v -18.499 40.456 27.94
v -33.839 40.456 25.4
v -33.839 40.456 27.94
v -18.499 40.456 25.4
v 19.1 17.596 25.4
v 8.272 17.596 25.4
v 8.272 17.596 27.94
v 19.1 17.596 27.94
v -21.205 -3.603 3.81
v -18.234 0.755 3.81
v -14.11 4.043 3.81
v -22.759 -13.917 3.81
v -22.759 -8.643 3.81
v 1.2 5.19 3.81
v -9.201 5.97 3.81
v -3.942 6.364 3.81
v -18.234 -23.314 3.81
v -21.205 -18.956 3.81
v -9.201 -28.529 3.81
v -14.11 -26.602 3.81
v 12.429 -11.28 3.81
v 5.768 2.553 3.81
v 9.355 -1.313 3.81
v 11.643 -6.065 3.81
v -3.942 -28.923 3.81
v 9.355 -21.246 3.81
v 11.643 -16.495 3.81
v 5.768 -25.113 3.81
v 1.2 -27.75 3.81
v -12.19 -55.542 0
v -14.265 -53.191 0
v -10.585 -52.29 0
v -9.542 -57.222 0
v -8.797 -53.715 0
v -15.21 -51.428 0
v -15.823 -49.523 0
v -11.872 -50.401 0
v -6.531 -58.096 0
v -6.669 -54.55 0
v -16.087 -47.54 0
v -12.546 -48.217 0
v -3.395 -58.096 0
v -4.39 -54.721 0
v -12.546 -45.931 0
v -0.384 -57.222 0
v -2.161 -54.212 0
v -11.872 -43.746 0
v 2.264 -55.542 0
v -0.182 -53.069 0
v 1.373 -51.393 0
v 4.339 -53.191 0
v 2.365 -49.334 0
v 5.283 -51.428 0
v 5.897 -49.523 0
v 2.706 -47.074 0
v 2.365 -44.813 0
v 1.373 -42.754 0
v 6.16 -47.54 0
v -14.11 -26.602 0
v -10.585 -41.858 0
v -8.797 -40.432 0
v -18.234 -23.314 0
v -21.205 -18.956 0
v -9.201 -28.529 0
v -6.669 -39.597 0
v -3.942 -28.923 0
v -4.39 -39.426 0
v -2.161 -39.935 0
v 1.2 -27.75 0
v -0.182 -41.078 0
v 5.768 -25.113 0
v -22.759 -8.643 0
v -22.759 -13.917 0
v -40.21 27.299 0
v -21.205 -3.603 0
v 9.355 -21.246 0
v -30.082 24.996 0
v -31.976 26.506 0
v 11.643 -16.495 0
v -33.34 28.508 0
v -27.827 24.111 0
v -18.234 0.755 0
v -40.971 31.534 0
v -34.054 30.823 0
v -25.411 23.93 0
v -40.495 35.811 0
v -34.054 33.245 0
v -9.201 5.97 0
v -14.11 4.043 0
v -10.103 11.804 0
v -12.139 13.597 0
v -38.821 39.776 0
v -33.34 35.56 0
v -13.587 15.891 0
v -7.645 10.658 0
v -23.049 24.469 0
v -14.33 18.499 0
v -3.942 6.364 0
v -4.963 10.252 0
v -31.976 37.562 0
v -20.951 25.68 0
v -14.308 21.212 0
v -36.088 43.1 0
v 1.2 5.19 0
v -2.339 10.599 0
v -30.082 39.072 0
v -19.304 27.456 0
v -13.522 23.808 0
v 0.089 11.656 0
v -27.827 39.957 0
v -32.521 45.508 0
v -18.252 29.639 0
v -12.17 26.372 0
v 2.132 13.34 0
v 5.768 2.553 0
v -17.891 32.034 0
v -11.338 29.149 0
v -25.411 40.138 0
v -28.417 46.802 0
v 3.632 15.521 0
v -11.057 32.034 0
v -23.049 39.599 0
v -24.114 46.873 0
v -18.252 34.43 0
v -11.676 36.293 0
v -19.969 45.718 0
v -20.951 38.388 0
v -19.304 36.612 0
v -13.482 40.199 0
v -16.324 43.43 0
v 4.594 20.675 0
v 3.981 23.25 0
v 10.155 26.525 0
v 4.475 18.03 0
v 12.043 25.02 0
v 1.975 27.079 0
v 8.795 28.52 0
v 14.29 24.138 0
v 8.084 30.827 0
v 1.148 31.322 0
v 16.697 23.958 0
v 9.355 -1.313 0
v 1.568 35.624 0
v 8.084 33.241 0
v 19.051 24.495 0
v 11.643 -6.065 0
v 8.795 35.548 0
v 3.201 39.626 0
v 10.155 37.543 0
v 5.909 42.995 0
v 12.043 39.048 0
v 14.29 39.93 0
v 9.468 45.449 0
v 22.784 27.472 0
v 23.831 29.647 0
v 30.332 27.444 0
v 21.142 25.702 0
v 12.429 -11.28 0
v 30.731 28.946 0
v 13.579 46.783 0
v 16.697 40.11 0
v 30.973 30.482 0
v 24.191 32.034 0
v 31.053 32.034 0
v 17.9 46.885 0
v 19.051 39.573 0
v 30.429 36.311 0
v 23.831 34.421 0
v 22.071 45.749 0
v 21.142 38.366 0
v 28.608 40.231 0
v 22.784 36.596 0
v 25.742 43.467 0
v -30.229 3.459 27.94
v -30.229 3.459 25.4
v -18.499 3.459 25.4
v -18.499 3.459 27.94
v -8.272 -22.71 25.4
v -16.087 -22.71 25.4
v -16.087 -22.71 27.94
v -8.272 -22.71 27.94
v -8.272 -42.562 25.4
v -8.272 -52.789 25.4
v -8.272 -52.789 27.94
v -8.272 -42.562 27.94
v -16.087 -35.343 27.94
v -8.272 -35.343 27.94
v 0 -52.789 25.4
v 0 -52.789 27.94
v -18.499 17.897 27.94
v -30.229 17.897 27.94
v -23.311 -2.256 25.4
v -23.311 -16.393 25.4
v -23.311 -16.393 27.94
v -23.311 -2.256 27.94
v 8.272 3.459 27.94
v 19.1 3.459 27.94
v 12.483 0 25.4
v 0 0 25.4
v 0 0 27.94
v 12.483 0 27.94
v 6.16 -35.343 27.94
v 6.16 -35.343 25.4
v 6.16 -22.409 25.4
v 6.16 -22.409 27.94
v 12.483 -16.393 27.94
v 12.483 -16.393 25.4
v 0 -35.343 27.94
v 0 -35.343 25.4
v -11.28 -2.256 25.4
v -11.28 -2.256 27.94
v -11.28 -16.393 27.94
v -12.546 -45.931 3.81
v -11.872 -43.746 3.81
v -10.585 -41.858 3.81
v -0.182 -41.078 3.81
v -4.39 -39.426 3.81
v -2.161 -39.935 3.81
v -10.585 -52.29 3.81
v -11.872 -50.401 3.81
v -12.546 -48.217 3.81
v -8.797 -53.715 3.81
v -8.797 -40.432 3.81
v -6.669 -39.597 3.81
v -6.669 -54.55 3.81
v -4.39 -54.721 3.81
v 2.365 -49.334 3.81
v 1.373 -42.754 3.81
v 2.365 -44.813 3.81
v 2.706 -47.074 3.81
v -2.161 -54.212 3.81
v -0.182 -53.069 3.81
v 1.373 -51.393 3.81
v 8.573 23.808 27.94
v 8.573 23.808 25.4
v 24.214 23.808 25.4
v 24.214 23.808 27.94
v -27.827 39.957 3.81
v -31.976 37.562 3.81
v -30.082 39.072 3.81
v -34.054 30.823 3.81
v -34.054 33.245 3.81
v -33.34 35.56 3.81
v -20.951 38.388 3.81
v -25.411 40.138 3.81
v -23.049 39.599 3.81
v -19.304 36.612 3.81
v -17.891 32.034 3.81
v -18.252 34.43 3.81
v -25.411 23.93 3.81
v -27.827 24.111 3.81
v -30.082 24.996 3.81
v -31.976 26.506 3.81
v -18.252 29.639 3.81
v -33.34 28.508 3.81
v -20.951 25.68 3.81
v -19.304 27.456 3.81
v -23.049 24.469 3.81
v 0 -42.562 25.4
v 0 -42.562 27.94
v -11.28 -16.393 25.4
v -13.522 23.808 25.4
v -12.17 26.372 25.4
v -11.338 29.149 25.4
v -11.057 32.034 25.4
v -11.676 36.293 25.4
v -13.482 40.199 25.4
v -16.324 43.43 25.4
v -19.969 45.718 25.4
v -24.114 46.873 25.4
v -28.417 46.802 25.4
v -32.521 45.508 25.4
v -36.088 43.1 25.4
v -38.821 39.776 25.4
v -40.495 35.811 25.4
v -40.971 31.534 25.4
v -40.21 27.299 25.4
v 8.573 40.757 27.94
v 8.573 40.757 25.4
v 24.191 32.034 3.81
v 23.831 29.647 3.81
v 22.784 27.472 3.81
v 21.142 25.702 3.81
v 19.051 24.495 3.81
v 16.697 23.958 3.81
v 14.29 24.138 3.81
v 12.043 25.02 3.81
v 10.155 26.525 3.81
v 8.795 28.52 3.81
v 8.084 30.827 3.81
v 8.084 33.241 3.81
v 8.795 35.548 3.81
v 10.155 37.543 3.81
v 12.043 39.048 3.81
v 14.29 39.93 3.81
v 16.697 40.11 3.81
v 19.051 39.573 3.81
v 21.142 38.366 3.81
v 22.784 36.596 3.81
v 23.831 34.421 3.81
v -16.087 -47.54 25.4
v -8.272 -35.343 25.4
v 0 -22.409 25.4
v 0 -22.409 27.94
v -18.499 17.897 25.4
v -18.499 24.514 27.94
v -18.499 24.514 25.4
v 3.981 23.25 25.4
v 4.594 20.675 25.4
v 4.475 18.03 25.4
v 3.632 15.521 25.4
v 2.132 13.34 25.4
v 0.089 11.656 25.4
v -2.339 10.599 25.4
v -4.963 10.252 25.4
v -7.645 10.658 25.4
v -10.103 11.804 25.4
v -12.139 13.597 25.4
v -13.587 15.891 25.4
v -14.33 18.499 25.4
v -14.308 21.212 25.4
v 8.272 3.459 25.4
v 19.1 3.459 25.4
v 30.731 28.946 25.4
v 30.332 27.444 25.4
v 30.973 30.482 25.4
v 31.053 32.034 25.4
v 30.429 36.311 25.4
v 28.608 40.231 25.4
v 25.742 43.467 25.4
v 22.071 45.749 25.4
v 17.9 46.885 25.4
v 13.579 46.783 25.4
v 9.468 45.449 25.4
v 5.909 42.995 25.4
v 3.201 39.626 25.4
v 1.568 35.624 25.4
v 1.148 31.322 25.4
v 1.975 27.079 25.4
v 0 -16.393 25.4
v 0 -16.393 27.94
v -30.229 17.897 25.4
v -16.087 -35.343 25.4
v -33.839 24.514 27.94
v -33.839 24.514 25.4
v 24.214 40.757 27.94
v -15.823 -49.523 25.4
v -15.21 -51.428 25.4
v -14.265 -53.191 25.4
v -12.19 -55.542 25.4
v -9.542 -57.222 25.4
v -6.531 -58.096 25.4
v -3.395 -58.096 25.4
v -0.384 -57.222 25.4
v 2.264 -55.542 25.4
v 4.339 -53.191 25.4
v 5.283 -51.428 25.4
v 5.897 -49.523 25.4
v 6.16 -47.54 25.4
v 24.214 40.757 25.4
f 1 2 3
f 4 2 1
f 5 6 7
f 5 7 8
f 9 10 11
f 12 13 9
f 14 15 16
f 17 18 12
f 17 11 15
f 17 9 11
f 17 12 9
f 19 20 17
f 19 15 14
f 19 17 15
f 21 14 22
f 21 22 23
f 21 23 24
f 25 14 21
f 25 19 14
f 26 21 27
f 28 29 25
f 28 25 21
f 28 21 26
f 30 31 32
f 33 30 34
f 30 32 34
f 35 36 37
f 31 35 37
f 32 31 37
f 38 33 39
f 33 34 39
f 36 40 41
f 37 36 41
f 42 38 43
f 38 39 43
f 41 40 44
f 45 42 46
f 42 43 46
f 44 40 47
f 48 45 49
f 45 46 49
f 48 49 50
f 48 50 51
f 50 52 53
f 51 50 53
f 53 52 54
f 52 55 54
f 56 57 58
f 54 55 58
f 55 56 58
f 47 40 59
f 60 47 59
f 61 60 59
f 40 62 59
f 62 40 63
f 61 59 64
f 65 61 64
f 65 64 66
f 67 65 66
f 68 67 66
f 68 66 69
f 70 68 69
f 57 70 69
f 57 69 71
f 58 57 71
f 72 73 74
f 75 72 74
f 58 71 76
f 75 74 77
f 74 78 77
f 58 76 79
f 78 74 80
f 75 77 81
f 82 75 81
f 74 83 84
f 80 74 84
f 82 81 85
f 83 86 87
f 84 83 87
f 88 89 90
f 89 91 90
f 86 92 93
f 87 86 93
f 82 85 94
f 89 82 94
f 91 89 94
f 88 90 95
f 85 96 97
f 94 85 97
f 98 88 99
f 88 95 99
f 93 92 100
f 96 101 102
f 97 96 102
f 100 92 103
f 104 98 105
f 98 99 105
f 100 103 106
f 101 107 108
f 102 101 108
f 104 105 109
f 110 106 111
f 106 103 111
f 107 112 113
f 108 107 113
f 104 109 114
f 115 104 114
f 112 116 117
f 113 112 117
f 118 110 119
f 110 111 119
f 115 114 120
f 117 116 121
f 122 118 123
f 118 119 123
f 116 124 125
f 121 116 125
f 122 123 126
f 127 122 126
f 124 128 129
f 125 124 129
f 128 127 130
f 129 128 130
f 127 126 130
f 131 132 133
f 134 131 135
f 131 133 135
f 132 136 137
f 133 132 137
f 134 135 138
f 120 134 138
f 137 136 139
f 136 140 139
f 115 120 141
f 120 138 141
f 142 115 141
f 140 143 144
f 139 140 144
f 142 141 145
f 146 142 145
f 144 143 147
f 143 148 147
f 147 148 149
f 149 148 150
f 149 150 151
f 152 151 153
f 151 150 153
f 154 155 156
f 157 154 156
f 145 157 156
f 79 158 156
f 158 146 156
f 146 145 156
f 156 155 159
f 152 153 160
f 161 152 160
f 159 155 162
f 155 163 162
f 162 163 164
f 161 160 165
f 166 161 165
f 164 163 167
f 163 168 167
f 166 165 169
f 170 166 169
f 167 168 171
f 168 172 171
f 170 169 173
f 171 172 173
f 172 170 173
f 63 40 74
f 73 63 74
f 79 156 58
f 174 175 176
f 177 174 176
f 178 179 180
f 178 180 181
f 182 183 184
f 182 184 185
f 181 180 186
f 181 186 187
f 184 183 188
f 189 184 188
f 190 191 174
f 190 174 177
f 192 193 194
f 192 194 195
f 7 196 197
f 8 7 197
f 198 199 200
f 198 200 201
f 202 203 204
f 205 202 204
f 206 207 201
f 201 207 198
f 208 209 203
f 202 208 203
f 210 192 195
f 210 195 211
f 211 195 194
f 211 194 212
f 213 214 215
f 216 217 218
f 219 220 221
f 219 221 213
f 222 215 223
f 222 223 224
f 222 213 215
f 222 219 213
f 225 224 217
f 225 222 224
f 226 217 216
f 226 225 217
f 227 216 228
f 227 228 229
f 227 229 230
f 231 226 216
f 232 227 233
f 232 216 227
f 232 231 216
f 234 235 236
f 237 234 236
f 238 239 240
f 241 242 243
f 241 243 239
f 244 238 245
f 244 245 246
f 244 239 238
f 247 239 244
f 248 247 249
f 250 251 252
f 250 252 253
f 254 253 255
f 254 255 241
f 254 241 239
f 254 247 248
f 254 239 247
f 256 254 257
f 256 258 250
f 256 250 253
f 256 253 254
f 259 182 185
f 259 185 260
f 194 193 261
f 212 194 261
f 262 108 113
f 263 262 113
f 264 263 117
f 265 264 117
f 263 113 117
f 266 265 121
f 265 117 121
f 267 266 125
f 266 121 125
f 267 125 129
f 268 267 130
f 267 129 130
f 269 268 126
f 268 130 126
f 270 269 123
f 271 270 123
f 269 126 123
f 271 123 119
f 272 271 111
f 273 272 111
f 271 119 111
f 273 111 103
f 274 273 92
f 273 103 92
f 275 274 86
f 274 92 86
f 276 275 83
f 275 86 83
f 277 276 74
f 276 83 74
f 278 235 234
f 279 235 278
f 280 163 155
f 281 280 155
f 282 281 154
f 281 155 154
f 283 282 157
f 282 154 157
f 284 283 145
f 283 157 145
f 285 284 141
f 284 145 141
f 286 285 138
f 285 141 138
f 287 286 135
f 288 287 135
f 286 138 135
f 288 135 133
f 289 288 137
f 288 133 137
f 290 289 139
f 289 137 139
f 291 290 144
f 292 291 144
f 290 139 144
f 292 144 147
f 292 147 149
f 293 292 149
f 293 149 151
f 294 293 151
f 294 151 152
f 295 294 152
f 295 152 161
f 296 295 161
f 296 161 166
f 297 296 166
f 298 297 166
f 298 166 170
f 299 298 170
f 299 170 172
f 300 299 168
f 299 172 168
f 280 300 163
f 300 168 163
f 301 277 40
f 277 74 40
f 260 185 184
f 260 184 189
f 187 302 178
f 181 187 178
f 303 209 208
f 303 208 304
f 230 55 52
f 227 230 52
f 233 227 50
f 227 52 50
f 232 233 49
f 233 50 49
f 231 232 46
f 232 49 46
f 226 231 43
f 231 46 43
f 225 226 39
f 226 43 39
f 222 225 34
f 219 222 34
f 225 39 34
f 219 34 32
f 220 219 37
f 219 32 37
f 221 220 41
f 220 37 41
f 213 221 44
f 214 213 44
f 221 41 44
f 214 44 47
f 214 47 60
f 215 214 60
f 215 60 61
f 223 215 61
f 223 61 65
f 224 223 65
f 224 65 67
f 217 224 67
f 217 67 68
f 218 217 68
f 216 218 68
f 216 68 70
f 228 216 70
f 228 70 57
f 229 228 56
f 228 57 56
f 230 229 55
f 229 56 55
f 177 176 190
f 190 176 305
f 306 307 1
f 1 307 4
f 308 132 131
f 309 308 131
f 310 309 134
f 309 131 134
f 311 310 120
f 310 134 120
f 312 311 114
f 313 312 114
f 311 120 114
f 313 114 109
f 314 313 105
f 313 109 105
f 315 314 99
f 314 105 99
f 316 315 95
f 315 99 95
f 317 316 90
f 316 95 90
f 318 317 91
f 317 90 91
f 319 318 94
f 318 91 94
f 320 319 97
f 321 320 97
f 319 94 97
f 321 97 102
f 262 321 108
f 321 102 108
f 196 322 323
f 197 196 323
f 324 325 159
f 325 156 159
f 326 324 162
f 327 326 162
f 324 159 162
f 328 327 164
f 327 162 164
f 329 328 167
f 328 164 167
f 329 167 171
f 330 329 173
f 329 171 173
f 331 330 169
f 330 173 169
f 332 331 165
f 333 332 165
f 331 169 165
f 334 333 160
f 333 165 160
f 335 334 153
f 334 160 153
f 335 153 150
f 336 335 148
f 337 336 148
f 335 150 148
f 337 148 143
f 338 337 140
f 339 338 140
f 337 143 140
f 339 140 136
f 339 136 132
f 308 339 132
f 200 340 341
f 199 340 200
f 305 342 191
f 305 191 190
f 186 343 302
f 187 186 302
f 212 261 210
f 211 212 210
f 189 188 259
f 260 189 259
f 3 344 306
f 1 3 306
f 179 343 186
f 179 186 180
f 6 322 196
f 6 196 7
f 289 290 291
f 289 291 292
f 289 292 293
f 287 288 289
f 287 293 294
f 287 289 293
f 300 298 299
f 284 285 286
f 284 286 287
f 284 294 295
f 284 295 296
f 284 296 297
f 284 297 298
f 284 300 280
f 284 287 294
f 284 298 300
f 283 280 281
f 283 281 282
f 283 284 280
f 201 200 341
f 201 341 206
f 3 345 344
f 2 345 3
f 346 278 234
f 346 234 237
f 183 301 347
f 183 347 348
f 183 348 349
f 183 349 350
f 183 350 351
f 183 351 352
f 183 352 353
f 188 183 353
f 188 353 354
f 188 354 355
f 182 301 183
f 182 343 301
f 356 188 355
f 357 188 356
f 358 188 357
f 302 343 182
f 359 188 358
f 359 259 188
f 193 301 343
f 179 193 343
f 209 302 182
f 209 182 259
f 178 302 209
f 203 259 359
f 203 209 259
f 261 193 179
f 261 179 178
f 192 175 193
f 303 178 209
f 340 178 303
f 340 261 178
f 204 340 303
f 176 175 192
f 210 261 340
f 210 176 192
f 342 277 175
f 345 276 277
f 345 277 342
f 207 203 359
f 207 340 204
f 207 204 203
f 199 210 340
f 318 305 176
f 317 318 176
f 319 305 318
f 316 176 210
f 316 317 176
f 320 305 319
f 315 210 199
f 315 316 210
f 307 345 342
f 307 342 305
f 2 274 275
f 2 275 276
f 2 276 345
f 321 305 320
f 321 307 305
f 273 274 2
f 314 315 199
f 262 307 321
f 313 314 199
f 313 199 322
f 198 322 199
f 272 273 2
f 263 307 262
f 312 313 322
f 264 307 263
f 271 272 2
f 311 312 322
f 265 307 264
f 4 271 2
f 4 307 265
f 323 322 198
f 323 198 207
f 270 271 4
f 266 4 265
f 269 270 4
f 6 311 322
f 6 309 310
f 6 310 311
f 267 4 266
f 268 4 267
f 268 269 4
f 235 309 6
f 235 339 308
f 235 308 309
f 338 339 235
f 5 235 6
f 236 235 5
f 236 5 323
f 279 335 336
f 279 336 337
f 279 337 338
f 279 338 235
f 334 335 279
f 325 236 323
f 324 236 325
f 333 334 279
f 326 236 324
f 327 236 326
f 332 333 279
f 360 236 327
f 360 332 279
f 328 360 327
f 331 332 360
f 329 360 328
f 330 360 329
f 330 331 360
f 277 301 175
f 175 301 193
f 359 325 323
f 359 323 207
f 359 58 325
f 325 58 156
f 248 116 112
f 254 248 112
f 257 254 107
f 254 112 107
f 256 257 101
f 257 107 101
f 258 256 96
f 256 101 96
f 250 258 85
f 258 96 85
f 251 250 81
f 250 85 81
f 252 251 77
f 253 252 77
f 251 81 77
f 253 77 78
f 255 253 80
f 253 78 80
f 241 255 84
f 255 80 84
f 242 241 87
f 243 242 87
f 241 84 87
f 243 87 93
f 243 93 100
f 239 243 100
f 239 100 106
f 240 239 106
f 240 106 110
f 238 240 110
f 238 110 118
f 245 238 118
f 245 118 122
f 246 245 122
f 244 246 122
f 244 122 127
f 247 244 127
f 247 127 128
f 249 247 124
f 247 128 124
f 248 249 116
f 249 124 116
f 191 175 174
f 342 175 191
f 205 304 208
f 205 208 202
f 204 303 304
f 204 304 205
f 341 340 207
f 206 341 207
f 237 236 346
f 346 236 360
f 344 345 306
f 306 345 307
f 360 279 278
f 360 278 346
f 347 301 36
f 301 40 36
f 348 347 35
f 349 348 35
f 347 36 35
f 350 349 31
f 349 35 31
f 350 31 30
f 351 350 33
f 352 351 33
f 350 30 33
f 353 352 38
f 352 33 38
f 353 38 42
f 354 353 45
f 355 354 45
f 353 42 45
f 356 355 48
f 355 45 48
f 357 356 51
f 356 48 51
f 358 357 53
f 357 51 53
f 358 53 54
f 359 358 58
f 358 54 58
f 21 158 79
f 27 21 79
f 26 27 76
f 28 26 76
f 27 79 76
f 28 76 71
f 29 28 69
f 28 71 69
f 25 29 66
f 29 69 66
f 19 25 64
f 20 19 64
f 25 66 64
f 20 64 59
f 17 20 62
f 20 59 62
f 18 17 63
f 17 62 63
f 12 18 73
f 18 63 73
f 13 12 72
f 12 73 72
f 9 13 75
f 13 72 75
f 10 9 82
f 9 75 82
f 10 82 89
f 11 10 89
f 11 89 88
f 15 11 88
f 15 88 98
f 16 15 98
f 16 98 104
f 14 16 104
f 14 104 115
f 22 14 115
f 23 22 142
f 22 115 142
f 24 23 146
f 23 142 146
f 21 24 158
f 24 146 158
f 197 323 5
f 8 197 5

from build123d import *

# Parameters (mm, degrees)
F1_DEPTH = 19.05
F2_R     = 8.1268855098
F2_R_2   = 8.0990060786
F2_R_3   = 7.6686570694
F2_R_4   = 17.6929682903
F3_DEPTH = 3.81
F4_DEPTH = 6.35
F5_W     = 15.3402648866
F5_H     = 15.9418415278
F5_W_2   = 11.7307901382
F5_H_2   = 14.437895501
F5_W_3   = 12.0315793902
F5_H_3   = 14.1371053178
F5_W_4   = 7.8148348501
F5_H_4   = 12.6331597567
F5_W_5   = 8.2717118785
F5_H_5   = 10.226842016
F5_W_6   = 6.1604853713
F5_H_6   = 12.9339471459
F5_W_7   = 12.4827632681
F5_H_7   = 16.393026337
F5_W_8   = 10.8284177259
F5_H_8   = 14.1371043865
F5_W_9   = 15.6410494819
F5_H_9   = 16.9490305329
F6_DEPTH = 2.54


with BuildPart() as f1:
    # F0 (on Top) → F1 (new body)
    with BuildSketch(Plane.XY):
        with BuildLine():
            ThreePointArc((-13.5217250534, 23.8079438364), (-11.6865877588, 27.7403908158), (-11.0572251912, 32.0340804756))
            ThreePointArc((-11.0572251912, 32.0340804756), (-28.416960574, 46.8016068241), (-40.2102085436, 27.2987980688))
            ThreePointArc((-40.2102085436, 27.2987980688), (-27.9586692008, 17.1993784674), (-13.5217250534, 23.8079438364))
        make_face()
        with BuildLine():
            ThreePointArc((-13.5217250534, 23.8079438364), (-27.9586692008, 17.1993784674), (-40.2102085436, 27.2987980688))
            Line((-40.2102085436, 27.2987980688), (-16.0865467286, -47.5395652548))
            ThreePointArc((-16.0865467286, -47.5395652548), (-12.9985133333, -39.3676590618), (-4.963026382, -35.9402766009))
            Line((-4.963026382, -35.9402766009), (-4.963026382, 10.2515674402))
            ThreePointArc((-4.963026382, 10.2515674402), (-12.9451700449, 14.6920290982), (-13.5217250534, 23.8079438364))
        make_face()
        with BuildLine():
            Line((-14.2646919421, -53.1914696578), (-16.0865467286, -47.5395652548))
            ThreePointArc((-16.0865467286, -47.5395652548), (-15.5593965471, -50.4892255554), (-14.2646919421, -53.1914696578))
        make_face()
        with BuildLine():
            ThreePointArc((-4.963026382, -35.9402766009), (-12.9985133333, -39.3676590618), (-16.0865467286, -47.5395652548))
            Line((-16.0865467286, -47.5395652548), (-14.2646919421, -53.1914696578))
            ThreePointArc((-14.2646919421, -53.1914696578), (-4.963026382, -58.2068318943), (4.3386391781, -53.1914696578))
            Line((4.3386391781, -53.1914696578), (6.1604853713, -47.5397703272))
            ThreePointArc((6.1604853713, -47.5397703272), (6.1678095236, -47.3067134237), (6.1702512647, -47.0735542476))
            ThreePointArc((6.1702512647, -47.0735542476), (2.9093897388, -39.2011381268), (-4.963026382, -35.9402766009))
        make_face()
        with BuildLine():
            ThreePointArc((3.9810605477, 23.2504104806), (2.9582476584, 14.377684043), (-4.963026382, 10.2515674402))
            Line((-4.963026382, 10.2515674402), (-4.963026382, -35.9402766009))
            ThreePointArc((-4.963026382, -35.9402766009), (2.9093897388, -39.2011381268), (6.1702512647, -47.0735542476))
            ThreePointArc((6.1702512647, -47.0735542476), (6.1678095236, -47.3067134237), (6.1604853713, -47.5397703272))
            Line((6.1604853713, -47.5397703272), (30.331755145, 27.443919136))
            ThreePointArc((30.331755145, 27.443919136), (18.4435852345, 17.2589453635), (3.9810605477, 23.2504104806))
        make_face()
        with BuildLine():
            ThreePointArc((31.0533017431, 32.0340804756), (11.4750214501, 46.2648490943), (3.9810605477, 23.2504104806))
            ThreePointArc((3.9810605477, 23.2504104806), (18.4435852345, 17.2589453635), (30.331755145, 27.443919136))
            ThreePointArc((30.331755145, 27.443919136), (30.8718143134, 29.7108171125), (31.0533017431, 32.0340804756))
        make_face()
        with BuildLine():
            Line((6.1604853713, -47.5397703272), (4.3386391781, -53.1914696578))
            ThreePointArc((4.3386391781, -53.1914696578), (5.6333122971, -50.4893232323), (6.1604853713, -47.5397703272))
        make_face()
    extrude(amount=F1_DEPTH)

    # F2 (on face) → F3 (cut)
    with BuildSketch(Plane(origin=(0, 0, 0), x_dir=(1, 0, 0), z_dir=(0, 0, -1))):
        with Locations((-26.0182898492, -32.0340804756)):
            Circle(F2_R)
        with Locations((16.0922370851, -32.0340804756)):
            Circle(F2_R_2)
        with Locations((-4.963026382, 47.0735542476)):
            Circle(F2_R_3)
        with Locations((-5.263815634, 11.279605329)):
            Circle(F2_R_4)
    extrude(amount=-F3_DEPTH, mode=Mode.SUBTRACT)

    # F4 (add): a face of the model
    f4_faces = [f1.faces().sort_by_distance(p)[0] for p in [
        (-4.9663739945, 1.7972425915, 19.05),
    ]]
    extrude(f4_faces, amount=F4_DEPTH)

    # F5 (on face) → F6 (join)
    with BuildSketch(Plane.XY.offset(25.4)):
        with Locations((-26.1686835438, 32.4852624908)):
            Rectangle(F5_W, F5_H)
        with Locations((-24.3639461696, 10.6780267088)):
            Rectangle(F5_W_2, F5_H_2)
        with Locations((-17.2953950241, -9.3244736781)):
            Rectangle(F5_W_3, F5_H_3)
        with Locations((-12.1791293035, -29.026184231)):
            Rectangle(F5_W_4, F5_H_4)
        with Locations((-4.1358559392, -47.6751308888)):
            Rectangle(F5_W_5, F5_H_5)
        with Locations((3.0802426856, -28.8757905364)):
            Rectangle(F5_W_6, F5_H_6)
        with Locations((6.241381634, -8.1965131685)):
            Rectangle(F5_W_7, F5_H_7)
        with Locations((13.6859207414, 10.5276311515)):
            Rectangle(F5_W_8, F5_H_8)
        with Locations((16.3930258714, 32.2824591028)):
            Rectangle(F5_W_9, F5_H_9)
    extrude(amount=F6_DEPTH)


solid = f1.part
